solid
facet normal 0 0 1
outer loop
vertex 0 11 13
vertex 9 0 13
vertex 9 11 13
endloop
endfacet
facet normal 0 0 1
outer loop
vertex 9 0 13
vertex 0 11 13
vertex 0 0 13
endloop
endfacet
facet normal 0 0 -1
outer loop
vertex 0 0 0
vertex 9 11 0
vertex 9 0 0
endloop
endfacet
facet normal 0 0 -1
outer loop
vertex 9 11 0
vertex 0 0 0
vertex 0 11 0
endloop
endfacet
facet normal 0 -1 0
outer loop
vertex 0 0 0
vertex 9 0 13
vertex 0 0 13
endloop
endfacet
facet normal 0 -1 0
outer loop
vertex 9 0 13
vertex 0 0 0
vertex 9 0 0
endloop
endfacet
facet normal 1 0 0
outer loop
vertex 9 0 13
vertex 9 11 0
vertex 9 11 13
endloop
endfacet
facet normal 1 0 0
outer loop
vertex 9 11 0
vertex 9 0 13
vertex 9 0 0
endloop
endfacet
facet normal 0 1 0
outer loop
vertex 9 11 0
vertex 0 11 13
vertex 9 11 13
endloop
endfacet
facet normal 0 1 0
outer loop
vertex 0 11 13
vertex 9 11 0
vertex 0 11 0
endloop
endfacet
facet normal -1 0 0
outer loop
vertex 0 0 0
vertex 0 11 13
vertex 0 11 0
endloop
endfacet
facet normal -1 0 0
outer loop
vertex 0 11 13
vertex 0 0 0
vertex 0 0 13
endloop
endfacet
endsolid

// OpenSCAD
// Generated by SolidPython 1.0.1 on 2020-07-29 00:46:55


cube(size = [9, 11, 13]);
/***********************************************
*********      SolidPython code:      **********
************************************************
 
# import packages: SolidPython
from solid import *
from solid.utils import *
from itertools import chain, combinations, permutations


class Resize:

    def __init__(self, scad_file):
        self.scad_file = scad_file
        #self.scad_file = import_scad(scad_file)
        # cone/cylinder param:
        self.r1 = 0
        self.r2 = 0
        self.h = 0
        # rectangular prism param:
        self.w = 0
        self.l = 0
        # ellipse param:
        self.r = 0

    # import OpenScad code (file name corresponds to shape)


    # classify shape + parameters
    def assign(self, param1, param2, param3):
        if self.scad_file == 'cone.scad':
            self.r1 = param1
            self.r2 = param2
            self.h = param3
        elif self.scad_file == 'cylinder.scad':
            self.r1 = param1
            self.r2 = param2
            self.h = param3
        elif self.scad_file == 'rectangularPrism.scad':
            self.h = param1
            self.l = param2
            self.w = param3
        else:
            self.r = param1
            self.h = param2

    # resize parameters
    def iterate(self):
        x = range(3, 20, 2)
        i = 1
        if self.scad_file == 'cone.scad':
            tempList = list(permutations(x, 2))
            for temp in tempList:
                param1 = temp[0]
                param2 = temp[1]
                filepath = 'produced_scad_files/' + 'cone' + str(param1) + '_' + str(param2) + '_' + '.scad'
                scad_render_to_file(cylinder(h=param1, r1=param2, r2=0), filepath)

        elif self.scad_file == 'cylinder.scad':
            tempList = list(permutations(x, 3))
            for temp in tempList:
                param1 = temp[0]
                param2 = temp[1]
                filepath = 'produced_scad_files/' + 'cylinder' + str(param1) + '_' + str(param2) + '_' + '.scad'
                scad_render_to_file(cylinder(h=param1, r1=param2, r2=param2), filepath)

        elif self.scad_file == 'rectangularPrism.scad':
            tempList = list(permutations(x, 3))
            for temp in tempList:
                param1 = temp[0]
                param2 = temp[1]
                param3 = temp[2]
                filepath = 'produced_scad_files/' + 'rectangularPrism' + str(param1) + '_' + str(param2) + '_' + str(
                    param3) + '.scad'
                scad_render_to_file(cube(size=(param1, param2, param3)), filepath)

        elif self.scad_file == 'ellipse.scad':
            tempList = list(permutations(x, 4))
            for temp in tempList:
                param1 = temp[0]
                param2 = temp[1]
                param3 = temp[2]
                param4 = temp[3]
                filepath = 'produced_scad_files/' + 'ellipse' + str(param1) + '_' + str(param2) + '_' + str(param3) + '_' + str(param4) + '.scad'
                scad_render_to_file(scale([param1, param2, param3])(sphere(r=param4)), filepath)

    def render_to_scadfile(self):
        scad_render_to_file(scad, 'example.scad') 
 
************************************************/
